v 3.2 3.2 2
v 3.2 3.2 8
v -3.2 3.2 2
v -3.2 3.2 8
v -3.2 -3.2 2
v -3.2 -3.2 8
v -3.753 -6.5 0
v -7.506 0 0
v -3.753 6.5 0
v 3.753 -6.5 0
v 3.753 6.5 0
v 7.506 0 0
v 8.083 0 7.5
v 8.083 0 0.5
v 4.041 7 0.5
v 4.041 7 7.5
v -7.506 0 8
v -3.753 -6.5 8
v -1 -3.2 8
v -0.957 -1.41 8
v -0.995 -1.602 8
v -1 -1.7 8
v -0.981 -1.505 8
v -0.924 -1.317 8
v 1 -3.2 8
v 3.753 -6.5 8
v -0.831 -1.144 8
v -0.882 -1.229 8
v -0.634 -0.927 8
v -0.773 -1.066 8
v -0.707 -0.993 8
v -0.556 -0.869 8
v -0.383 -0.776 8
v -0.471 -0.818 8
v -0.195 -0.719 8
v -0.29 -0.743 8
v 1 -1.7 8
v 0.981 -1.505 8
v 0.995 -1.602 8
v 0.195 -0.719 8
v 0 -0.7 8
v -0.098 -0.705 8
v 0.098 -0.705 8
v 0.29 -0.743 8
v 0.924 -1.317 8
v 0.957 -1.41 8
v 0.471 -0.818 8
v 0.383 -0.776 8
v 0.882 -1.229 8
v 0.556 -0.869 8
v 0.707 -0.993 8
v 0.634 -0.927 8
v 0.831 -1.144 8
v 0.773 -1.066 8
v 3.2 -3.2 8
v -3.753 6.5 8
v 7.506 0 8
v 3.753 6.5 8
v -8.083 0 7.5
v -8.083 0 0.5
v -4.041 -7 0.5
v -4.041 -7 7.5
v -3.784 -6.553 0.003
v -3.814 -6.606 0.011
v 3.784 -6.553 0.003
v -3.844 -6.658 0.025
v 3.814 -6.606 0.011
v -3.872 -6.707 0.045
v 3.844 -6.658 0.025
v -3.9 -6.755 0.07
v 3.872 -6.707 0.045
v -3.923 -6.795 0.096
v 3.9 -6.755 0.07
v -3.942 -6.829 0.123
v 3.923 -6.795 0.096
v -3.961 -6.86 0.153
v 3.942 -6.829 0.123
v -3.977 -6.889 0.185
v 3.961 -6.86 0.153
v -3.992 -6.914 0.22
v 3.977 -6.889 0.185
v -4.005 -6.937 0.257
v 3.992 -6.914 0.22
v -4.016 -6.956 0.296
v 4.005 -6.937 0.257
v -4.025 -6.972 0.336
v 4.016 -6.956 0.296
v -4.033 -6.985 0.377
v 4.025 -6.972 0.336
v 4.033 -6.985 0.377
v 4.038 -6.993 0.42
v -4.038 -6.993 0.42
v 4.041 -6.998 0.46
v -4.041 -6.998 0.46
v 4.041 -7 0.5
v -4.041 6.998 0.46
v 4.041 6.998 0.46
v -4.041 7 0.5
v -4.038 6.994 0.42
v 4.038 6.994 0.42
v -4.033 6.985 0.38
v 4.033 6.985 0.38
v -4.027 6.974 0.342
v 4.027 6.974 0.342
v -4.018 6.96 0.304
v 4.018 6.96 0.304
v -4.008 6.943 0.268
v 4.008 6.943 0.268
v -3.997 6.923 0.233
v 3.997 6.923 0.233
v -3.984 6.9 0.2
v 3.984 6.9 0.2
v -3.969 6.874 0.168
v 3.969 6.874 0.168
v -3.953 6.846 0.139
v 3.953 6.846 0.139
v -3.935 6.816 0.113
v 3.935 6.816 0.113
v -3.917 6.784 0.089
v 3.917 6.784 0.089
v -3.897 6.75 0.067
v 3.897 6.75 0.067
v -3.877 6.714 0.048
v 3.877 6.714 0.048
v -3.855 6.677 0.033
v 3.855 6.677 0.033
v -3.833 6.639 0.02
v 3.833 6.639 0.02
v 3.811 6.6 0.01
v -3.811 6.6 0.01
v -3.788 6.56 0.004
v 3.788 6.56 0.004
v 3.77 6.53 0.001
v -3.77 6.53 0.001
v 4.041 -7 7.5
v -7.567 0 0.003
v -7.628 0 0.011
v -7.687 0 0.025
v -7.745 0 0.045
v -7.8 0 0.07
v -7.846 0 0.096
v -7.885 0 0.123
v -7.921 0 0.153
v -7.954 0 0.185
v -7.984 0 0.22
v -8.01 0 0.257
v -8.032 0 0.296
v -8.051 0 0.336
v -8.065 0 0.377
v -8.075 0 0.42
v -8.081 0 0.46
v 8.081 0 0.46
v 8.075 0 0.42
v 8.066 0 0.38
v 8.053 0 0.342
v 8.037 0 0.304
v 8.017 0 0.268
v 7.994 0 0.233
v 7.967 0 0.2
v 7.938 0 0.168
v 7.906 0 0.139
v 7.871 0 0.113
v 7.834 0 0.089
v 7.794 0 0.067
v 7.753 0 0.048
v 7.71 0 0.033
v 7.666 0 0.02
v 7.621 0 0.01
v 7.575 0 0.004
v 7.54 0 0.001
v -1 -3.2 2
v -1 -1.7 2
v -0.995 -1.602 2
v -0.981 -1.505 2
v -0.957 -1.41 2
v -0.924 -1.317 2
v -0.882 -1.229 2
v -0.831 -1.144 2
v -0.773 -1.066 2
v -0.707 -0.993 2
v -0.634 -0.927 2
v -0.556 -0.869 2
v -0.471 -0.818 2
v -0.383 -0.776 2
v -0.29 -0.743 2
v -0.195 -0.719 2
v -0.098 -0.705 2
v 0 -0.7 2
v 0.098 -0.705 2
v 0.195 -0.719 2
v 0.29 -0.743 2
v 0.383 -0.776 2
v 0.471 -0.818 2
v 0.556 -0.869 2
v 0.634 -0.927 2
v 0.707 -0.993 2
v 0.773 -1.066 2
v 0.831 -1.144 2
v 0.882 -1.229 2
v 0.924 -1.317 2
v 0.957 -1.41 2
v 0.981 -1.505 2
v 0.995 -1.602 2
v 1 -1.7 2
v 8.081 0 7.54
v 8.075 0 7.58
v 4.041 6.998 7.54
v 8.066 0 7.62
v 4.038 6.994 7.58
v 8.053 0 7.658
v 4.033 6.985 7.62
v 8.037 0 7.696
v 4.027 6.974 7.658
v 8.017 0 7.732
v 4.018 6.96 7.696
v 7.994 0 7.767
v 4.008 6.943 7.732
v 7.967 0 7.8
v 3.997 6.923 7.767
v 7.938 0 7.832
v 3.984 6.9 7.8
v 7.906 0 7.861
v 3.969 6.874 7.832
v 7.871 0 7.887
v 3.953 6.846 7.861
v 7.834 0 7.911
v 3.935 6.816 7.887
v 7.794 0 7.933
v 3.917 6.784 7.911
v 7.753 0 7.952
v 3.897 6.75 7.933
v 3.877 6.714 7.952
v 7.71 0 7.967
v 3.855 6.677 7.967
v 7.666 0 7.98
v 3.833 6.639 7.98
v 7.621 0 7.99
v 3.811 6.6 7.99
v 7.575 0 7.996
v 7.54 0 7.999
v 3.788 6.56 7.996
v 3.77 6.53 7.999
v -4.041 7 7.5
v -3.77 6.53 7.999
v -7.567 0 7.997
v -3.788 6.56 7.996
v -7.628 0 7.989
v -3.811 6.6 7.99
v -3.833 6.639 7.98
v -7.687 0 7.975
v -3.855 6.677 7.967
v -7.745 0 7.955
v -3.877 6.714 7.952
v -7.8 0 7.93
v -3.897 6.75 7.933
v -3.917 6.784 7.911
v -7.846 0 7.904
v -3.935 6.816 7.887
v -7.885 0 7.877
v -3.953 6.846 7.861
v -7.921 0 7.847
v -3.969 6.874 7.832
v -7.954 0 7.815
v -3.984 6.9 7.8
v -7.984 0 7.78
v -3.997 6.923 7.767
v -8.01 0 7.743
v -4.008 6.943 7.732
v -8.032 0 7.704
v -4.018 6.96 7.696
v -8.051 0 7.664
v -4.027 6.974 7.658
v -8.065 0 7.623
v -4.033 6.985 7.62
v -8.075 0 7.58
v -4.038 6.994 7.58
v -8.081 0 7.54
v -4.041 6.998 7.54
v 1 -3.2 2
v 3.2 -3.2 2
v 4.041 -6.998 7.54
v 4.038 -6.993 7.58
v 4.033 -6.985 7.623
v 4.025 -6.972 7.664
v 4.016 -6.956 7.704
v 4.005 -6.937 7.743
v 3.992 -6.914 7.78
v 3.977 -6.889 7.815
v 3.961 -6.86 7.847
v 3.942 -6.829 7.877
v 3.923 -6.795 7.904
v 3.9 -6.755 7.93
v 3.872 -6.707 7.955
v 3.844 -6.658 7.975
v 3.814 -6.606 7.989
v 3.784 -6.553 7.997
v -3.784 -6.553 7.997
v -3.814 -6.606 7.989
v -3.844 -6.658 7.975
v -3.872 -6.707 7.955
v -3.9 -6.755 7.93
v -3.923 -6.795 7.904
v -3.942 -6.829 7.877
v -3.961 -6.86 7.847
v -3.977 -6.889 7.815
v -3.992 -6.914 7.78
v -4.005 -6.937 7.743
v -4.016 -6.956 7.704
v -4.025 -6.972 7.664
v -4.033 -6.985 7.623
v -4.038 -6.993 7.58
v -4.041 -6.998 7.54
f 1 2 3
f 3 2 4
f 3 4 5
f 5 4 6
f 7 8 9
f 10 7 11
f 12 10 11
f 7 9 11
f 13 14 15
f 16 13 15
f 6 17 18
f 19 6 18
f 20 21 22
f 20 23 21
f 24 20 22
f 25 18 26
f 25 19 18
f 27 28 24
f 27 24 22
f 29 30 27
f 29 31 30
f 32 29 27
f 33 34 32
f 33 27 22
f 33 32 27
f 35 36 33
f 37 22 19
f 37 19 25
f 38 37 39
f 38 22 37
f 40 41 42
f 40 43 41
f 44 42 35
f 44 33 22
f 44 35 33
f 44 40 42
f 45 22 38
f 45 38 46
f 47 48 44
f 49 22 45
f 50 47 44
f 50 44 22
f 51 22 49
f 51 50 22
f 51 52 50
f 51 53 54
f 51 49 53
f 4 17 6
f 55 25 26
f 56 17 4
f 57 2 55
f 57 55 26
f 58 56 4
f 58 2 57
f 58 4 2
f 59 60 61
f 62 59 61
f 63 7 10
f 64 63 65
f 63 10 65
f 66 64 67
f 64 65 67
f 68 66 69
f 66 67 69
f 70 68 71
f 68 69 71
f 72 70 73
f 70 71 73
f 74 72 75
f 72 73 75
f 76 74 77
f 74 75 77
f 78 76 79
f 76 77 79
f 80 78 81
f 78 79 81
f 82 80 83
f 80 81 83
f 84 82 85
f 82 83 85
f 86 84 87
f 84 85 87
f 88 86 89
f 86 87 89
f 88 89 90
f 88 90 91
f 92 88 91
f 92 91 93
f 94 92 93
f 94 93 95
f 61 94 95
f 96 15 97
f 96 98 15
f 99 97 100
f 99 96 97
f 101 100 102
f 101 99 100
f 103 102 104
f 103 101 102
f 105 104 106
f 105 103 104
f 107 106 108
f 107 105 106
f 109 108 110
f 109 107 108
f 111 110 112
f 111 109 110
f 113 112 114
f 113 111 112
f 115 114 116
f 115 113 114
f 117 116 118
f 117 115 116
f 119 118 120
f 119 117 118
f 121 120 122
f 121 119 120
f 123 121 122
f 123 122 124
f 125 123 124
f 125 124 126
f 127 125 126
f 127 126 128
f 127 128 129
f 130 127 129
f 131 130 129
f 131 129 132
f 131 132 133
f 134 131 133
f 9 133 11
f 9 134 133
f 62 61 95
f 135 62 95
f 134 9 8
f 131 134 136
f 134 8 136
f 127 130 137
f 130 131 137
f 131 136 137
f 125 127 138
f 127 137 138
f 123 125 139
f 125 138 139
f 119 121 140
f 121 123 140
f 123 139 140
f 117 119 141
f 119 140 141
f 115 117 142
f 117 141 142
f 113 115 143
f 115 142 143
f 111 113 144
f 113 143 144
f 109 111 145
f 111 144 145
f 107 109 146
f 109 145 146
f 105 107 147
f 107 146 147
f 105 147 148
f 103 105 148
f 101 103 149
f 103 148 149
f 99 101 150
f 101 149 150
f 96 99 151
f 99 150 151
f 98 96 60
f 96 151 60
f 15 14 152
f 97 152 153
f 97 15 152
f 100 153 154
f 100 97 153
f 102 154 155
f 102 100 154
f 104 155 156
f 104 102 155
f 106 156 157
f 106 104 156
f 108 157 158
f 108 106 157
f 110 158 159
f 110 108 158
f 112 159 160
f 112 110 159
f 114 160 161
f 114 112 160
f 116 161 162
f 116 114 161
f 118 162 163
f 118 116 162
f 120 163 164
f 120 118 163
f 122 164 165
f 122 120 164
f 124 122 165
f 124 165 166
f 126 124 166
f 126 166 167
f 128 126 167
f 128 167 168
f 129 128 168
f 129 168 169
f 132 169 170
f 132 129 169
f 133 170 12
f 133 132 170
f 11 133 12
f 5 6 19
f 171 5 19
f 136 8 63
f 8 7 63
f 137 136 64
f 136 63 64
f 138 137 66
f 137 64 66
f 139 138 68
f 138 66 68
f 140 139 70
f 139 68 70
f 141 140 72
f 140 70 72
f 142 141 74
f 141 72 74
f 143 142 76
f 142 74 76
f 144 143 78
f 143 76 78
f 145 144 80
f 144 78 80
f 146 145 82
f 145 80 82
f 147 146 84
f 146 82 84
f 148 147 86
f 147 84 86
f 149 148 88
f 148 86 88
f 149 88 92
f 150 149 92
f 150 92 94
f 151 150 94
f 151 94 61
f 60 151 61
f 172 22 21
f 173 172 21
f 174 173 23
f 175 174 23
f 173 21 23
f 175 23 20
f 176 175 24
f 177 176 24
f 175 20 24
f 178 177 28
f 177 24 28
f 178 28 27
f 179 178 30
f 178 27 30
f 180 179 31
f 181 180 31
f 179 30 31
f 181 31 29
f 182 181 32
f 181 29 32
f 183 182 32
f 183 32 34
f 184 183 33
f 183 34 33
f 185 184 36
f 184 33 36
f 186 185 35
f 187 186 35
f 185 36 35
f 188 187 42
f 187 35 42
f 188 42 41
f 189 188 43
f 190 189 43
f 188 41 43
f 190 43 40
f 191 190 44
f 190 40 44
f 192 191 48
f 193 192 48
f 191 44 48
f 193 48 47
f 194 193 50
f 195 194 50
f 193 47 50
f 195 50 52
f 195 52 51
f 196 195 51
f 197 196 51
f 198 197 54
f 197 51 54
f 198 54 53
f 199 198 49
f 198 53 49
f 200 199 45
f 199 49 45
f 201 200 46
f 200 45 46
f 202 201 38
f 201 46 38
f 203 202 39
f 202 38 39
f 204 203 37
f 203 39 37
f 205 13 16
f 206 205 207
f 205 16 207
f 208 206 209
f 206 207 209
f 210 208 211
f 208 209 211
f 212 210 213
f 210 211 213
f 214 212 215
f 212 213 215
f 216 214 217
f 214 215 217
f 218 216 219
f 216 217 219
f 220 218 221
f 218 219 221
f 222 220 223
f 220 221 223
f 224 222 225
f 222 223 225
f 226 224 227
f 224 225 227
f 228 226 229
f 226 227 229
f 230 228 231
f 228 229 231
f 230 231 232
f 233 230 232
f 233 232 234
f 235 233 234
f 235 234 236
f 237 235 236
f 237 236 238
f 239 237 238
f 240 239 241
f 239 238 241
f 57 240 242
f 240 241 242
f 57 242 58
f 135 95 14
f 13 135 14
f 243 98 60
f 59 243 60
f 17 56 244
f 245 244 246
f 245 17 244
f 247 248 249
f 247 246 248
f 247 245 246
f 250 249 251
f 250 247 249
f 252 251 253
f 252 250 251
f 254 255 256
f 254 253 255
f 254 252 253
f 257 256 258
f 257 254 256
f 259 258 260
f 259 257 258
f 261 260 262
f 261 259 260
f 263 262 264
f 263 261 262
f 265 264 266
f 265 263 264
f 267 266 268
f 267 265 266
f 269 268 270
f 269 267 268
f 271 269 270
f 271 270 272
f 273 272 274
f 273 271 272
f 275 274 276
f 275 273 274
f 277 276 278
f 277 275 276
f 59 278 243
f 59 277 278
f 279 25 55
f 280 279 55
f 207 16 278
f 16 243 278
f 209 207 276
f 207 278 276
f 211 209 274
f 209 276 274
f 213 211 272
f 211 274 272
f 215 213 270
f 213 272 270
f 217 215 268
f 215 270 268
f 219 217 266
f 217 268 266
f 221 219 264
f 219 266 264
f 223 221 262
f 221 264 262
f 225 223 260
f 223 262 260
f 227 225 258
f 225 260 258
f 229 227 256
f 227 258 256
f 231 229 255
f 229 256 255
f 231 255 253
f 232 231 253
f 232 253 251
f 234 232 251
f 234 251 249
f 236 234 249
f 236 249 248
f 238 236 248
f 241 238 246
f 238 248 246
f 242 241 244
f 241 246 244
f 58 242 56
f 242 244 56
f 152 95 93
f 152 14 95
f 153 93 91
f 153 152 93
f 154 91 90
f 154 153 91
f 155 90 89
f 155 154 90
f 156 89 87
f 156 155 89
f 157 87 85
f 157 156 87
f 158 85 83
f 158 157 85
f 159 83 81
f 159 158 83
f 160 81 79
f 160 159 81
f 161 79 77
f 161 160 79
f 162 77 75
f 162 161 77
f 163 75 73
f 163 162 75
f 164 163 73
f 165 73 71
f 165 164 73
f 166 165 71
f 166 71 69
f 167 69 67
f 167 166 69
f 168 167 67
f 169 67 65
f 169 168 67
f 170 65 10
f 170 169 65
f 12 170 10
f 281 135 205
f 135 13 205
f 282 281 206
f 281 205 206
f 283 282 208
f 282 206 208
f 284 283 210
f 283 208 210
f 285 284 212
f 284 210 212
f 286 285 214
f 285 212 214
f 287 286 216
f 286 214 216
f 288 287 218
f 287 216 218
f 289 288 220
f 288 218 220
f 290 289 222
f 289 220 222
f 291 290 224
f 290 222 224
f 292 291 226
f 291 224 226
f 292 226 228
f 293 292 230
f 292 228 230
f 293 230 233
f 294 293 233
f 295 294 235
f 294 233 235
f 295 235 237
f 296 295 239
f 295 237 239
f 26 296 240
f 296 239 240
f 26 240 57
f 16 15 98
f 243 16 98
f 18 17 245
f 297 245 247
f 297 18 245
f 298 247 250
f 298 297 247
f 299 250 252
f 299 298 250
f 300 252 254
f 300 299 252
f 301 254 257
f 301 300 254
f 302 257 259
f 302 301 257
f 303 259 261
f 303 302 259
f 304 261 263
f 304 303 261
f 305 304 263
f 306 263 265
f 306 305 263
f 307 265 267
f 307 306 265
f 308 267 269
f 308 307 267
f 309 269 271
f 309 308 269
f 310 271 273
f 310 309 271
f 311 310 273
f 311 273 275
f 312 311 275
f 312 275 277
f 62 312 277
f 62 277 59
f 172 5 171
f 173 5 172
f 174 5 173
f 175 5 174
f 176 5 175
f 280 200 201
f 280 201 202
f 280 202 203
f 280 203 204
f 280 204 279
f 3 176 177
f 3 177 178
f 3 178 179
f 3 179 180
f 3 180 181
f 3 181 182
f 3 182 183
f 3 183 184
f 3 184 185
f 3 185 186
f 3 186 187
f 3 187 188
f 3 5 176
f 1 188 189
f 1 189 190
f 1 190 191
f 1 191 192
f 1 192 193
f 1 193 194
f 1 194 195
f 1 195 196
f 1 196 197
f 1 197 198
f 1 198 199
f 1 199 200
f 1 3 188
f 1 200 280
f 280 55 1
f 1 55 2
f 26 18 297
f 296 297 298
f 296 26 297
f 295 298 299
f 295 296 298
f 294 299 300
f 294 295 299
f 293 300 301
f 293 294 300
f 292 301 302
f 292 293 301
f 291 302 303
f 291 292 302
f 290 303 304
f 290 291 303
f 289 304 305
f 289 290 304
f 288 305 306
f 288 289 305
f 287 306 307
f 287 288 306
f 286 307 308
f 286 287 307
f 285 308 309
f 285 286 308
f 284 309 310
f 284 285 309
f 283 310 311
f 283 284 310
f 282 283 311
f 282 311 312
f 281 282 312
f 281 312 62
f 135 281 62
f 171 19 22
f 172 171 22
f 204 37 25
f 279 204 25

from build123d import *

# Parameters (mm, degrees)
F1_DEPTH = 8
F3_DEPTH = 6
F4_R     = 0.5


with BuildPart() as f1:
    # F0 (on Top) → F1 (new body)
    with BuildSketch(Plane.XY):
        Polygon((8.082904, 0), (4.041452, 7), (-4.041452, 7), (-8.082904, 0), (-4.041452, -7), (4.041452, -7), align=None)
    extrude(amount=F1_DEPTH)

    # F2 (on face) → F3 (cut)
    with BuildSketch(Plane.XY.offset(8)):
        with BuildLine():
            Line((3.2, -3.2), (3.2, 3.2))
            Line((3.2, 3.2), (-3.2, 3.2))
            Line((-3.2, 3.2), (-3.2, -3.2))
            Line((-3.2, -3.2), (-1, -3.2))
            Line((-1, -3.2), (-1, -1.7))
            ThreePointArc((-1, -1.7), (0, -0.7), (1, -1.7))
            Line((1, -1.7), (1, -3.2))
            Line((1, -3.2), (3.2, -3.2))
        make_face()
    extrude(amount=-F3_DEPTH, mode=Mode.SUBTRACT)

    # F4
    f4_edges = [f1.edges().sort_by_distance(p)[0] for p in [
        (-6.062178, -3.5, 0),
        (0, -7, 0),
        (6.062178, -3.5, 0),
        (6.062178, 3.5, 0),
        (0, 7, 0),
        (-6.062178, 3.5, 0),
        (0, -7, 8),
        (6.062178, -3.5, 8),
        (6.062178, 3.5, 8),
        (0, 7, 8),
        (-6.062178, 3.5, 8),
        (-6.062178, -3.5, 8),
    ]]
    fillet(f4_edges, radius=F4_R)


solid = f1.part
